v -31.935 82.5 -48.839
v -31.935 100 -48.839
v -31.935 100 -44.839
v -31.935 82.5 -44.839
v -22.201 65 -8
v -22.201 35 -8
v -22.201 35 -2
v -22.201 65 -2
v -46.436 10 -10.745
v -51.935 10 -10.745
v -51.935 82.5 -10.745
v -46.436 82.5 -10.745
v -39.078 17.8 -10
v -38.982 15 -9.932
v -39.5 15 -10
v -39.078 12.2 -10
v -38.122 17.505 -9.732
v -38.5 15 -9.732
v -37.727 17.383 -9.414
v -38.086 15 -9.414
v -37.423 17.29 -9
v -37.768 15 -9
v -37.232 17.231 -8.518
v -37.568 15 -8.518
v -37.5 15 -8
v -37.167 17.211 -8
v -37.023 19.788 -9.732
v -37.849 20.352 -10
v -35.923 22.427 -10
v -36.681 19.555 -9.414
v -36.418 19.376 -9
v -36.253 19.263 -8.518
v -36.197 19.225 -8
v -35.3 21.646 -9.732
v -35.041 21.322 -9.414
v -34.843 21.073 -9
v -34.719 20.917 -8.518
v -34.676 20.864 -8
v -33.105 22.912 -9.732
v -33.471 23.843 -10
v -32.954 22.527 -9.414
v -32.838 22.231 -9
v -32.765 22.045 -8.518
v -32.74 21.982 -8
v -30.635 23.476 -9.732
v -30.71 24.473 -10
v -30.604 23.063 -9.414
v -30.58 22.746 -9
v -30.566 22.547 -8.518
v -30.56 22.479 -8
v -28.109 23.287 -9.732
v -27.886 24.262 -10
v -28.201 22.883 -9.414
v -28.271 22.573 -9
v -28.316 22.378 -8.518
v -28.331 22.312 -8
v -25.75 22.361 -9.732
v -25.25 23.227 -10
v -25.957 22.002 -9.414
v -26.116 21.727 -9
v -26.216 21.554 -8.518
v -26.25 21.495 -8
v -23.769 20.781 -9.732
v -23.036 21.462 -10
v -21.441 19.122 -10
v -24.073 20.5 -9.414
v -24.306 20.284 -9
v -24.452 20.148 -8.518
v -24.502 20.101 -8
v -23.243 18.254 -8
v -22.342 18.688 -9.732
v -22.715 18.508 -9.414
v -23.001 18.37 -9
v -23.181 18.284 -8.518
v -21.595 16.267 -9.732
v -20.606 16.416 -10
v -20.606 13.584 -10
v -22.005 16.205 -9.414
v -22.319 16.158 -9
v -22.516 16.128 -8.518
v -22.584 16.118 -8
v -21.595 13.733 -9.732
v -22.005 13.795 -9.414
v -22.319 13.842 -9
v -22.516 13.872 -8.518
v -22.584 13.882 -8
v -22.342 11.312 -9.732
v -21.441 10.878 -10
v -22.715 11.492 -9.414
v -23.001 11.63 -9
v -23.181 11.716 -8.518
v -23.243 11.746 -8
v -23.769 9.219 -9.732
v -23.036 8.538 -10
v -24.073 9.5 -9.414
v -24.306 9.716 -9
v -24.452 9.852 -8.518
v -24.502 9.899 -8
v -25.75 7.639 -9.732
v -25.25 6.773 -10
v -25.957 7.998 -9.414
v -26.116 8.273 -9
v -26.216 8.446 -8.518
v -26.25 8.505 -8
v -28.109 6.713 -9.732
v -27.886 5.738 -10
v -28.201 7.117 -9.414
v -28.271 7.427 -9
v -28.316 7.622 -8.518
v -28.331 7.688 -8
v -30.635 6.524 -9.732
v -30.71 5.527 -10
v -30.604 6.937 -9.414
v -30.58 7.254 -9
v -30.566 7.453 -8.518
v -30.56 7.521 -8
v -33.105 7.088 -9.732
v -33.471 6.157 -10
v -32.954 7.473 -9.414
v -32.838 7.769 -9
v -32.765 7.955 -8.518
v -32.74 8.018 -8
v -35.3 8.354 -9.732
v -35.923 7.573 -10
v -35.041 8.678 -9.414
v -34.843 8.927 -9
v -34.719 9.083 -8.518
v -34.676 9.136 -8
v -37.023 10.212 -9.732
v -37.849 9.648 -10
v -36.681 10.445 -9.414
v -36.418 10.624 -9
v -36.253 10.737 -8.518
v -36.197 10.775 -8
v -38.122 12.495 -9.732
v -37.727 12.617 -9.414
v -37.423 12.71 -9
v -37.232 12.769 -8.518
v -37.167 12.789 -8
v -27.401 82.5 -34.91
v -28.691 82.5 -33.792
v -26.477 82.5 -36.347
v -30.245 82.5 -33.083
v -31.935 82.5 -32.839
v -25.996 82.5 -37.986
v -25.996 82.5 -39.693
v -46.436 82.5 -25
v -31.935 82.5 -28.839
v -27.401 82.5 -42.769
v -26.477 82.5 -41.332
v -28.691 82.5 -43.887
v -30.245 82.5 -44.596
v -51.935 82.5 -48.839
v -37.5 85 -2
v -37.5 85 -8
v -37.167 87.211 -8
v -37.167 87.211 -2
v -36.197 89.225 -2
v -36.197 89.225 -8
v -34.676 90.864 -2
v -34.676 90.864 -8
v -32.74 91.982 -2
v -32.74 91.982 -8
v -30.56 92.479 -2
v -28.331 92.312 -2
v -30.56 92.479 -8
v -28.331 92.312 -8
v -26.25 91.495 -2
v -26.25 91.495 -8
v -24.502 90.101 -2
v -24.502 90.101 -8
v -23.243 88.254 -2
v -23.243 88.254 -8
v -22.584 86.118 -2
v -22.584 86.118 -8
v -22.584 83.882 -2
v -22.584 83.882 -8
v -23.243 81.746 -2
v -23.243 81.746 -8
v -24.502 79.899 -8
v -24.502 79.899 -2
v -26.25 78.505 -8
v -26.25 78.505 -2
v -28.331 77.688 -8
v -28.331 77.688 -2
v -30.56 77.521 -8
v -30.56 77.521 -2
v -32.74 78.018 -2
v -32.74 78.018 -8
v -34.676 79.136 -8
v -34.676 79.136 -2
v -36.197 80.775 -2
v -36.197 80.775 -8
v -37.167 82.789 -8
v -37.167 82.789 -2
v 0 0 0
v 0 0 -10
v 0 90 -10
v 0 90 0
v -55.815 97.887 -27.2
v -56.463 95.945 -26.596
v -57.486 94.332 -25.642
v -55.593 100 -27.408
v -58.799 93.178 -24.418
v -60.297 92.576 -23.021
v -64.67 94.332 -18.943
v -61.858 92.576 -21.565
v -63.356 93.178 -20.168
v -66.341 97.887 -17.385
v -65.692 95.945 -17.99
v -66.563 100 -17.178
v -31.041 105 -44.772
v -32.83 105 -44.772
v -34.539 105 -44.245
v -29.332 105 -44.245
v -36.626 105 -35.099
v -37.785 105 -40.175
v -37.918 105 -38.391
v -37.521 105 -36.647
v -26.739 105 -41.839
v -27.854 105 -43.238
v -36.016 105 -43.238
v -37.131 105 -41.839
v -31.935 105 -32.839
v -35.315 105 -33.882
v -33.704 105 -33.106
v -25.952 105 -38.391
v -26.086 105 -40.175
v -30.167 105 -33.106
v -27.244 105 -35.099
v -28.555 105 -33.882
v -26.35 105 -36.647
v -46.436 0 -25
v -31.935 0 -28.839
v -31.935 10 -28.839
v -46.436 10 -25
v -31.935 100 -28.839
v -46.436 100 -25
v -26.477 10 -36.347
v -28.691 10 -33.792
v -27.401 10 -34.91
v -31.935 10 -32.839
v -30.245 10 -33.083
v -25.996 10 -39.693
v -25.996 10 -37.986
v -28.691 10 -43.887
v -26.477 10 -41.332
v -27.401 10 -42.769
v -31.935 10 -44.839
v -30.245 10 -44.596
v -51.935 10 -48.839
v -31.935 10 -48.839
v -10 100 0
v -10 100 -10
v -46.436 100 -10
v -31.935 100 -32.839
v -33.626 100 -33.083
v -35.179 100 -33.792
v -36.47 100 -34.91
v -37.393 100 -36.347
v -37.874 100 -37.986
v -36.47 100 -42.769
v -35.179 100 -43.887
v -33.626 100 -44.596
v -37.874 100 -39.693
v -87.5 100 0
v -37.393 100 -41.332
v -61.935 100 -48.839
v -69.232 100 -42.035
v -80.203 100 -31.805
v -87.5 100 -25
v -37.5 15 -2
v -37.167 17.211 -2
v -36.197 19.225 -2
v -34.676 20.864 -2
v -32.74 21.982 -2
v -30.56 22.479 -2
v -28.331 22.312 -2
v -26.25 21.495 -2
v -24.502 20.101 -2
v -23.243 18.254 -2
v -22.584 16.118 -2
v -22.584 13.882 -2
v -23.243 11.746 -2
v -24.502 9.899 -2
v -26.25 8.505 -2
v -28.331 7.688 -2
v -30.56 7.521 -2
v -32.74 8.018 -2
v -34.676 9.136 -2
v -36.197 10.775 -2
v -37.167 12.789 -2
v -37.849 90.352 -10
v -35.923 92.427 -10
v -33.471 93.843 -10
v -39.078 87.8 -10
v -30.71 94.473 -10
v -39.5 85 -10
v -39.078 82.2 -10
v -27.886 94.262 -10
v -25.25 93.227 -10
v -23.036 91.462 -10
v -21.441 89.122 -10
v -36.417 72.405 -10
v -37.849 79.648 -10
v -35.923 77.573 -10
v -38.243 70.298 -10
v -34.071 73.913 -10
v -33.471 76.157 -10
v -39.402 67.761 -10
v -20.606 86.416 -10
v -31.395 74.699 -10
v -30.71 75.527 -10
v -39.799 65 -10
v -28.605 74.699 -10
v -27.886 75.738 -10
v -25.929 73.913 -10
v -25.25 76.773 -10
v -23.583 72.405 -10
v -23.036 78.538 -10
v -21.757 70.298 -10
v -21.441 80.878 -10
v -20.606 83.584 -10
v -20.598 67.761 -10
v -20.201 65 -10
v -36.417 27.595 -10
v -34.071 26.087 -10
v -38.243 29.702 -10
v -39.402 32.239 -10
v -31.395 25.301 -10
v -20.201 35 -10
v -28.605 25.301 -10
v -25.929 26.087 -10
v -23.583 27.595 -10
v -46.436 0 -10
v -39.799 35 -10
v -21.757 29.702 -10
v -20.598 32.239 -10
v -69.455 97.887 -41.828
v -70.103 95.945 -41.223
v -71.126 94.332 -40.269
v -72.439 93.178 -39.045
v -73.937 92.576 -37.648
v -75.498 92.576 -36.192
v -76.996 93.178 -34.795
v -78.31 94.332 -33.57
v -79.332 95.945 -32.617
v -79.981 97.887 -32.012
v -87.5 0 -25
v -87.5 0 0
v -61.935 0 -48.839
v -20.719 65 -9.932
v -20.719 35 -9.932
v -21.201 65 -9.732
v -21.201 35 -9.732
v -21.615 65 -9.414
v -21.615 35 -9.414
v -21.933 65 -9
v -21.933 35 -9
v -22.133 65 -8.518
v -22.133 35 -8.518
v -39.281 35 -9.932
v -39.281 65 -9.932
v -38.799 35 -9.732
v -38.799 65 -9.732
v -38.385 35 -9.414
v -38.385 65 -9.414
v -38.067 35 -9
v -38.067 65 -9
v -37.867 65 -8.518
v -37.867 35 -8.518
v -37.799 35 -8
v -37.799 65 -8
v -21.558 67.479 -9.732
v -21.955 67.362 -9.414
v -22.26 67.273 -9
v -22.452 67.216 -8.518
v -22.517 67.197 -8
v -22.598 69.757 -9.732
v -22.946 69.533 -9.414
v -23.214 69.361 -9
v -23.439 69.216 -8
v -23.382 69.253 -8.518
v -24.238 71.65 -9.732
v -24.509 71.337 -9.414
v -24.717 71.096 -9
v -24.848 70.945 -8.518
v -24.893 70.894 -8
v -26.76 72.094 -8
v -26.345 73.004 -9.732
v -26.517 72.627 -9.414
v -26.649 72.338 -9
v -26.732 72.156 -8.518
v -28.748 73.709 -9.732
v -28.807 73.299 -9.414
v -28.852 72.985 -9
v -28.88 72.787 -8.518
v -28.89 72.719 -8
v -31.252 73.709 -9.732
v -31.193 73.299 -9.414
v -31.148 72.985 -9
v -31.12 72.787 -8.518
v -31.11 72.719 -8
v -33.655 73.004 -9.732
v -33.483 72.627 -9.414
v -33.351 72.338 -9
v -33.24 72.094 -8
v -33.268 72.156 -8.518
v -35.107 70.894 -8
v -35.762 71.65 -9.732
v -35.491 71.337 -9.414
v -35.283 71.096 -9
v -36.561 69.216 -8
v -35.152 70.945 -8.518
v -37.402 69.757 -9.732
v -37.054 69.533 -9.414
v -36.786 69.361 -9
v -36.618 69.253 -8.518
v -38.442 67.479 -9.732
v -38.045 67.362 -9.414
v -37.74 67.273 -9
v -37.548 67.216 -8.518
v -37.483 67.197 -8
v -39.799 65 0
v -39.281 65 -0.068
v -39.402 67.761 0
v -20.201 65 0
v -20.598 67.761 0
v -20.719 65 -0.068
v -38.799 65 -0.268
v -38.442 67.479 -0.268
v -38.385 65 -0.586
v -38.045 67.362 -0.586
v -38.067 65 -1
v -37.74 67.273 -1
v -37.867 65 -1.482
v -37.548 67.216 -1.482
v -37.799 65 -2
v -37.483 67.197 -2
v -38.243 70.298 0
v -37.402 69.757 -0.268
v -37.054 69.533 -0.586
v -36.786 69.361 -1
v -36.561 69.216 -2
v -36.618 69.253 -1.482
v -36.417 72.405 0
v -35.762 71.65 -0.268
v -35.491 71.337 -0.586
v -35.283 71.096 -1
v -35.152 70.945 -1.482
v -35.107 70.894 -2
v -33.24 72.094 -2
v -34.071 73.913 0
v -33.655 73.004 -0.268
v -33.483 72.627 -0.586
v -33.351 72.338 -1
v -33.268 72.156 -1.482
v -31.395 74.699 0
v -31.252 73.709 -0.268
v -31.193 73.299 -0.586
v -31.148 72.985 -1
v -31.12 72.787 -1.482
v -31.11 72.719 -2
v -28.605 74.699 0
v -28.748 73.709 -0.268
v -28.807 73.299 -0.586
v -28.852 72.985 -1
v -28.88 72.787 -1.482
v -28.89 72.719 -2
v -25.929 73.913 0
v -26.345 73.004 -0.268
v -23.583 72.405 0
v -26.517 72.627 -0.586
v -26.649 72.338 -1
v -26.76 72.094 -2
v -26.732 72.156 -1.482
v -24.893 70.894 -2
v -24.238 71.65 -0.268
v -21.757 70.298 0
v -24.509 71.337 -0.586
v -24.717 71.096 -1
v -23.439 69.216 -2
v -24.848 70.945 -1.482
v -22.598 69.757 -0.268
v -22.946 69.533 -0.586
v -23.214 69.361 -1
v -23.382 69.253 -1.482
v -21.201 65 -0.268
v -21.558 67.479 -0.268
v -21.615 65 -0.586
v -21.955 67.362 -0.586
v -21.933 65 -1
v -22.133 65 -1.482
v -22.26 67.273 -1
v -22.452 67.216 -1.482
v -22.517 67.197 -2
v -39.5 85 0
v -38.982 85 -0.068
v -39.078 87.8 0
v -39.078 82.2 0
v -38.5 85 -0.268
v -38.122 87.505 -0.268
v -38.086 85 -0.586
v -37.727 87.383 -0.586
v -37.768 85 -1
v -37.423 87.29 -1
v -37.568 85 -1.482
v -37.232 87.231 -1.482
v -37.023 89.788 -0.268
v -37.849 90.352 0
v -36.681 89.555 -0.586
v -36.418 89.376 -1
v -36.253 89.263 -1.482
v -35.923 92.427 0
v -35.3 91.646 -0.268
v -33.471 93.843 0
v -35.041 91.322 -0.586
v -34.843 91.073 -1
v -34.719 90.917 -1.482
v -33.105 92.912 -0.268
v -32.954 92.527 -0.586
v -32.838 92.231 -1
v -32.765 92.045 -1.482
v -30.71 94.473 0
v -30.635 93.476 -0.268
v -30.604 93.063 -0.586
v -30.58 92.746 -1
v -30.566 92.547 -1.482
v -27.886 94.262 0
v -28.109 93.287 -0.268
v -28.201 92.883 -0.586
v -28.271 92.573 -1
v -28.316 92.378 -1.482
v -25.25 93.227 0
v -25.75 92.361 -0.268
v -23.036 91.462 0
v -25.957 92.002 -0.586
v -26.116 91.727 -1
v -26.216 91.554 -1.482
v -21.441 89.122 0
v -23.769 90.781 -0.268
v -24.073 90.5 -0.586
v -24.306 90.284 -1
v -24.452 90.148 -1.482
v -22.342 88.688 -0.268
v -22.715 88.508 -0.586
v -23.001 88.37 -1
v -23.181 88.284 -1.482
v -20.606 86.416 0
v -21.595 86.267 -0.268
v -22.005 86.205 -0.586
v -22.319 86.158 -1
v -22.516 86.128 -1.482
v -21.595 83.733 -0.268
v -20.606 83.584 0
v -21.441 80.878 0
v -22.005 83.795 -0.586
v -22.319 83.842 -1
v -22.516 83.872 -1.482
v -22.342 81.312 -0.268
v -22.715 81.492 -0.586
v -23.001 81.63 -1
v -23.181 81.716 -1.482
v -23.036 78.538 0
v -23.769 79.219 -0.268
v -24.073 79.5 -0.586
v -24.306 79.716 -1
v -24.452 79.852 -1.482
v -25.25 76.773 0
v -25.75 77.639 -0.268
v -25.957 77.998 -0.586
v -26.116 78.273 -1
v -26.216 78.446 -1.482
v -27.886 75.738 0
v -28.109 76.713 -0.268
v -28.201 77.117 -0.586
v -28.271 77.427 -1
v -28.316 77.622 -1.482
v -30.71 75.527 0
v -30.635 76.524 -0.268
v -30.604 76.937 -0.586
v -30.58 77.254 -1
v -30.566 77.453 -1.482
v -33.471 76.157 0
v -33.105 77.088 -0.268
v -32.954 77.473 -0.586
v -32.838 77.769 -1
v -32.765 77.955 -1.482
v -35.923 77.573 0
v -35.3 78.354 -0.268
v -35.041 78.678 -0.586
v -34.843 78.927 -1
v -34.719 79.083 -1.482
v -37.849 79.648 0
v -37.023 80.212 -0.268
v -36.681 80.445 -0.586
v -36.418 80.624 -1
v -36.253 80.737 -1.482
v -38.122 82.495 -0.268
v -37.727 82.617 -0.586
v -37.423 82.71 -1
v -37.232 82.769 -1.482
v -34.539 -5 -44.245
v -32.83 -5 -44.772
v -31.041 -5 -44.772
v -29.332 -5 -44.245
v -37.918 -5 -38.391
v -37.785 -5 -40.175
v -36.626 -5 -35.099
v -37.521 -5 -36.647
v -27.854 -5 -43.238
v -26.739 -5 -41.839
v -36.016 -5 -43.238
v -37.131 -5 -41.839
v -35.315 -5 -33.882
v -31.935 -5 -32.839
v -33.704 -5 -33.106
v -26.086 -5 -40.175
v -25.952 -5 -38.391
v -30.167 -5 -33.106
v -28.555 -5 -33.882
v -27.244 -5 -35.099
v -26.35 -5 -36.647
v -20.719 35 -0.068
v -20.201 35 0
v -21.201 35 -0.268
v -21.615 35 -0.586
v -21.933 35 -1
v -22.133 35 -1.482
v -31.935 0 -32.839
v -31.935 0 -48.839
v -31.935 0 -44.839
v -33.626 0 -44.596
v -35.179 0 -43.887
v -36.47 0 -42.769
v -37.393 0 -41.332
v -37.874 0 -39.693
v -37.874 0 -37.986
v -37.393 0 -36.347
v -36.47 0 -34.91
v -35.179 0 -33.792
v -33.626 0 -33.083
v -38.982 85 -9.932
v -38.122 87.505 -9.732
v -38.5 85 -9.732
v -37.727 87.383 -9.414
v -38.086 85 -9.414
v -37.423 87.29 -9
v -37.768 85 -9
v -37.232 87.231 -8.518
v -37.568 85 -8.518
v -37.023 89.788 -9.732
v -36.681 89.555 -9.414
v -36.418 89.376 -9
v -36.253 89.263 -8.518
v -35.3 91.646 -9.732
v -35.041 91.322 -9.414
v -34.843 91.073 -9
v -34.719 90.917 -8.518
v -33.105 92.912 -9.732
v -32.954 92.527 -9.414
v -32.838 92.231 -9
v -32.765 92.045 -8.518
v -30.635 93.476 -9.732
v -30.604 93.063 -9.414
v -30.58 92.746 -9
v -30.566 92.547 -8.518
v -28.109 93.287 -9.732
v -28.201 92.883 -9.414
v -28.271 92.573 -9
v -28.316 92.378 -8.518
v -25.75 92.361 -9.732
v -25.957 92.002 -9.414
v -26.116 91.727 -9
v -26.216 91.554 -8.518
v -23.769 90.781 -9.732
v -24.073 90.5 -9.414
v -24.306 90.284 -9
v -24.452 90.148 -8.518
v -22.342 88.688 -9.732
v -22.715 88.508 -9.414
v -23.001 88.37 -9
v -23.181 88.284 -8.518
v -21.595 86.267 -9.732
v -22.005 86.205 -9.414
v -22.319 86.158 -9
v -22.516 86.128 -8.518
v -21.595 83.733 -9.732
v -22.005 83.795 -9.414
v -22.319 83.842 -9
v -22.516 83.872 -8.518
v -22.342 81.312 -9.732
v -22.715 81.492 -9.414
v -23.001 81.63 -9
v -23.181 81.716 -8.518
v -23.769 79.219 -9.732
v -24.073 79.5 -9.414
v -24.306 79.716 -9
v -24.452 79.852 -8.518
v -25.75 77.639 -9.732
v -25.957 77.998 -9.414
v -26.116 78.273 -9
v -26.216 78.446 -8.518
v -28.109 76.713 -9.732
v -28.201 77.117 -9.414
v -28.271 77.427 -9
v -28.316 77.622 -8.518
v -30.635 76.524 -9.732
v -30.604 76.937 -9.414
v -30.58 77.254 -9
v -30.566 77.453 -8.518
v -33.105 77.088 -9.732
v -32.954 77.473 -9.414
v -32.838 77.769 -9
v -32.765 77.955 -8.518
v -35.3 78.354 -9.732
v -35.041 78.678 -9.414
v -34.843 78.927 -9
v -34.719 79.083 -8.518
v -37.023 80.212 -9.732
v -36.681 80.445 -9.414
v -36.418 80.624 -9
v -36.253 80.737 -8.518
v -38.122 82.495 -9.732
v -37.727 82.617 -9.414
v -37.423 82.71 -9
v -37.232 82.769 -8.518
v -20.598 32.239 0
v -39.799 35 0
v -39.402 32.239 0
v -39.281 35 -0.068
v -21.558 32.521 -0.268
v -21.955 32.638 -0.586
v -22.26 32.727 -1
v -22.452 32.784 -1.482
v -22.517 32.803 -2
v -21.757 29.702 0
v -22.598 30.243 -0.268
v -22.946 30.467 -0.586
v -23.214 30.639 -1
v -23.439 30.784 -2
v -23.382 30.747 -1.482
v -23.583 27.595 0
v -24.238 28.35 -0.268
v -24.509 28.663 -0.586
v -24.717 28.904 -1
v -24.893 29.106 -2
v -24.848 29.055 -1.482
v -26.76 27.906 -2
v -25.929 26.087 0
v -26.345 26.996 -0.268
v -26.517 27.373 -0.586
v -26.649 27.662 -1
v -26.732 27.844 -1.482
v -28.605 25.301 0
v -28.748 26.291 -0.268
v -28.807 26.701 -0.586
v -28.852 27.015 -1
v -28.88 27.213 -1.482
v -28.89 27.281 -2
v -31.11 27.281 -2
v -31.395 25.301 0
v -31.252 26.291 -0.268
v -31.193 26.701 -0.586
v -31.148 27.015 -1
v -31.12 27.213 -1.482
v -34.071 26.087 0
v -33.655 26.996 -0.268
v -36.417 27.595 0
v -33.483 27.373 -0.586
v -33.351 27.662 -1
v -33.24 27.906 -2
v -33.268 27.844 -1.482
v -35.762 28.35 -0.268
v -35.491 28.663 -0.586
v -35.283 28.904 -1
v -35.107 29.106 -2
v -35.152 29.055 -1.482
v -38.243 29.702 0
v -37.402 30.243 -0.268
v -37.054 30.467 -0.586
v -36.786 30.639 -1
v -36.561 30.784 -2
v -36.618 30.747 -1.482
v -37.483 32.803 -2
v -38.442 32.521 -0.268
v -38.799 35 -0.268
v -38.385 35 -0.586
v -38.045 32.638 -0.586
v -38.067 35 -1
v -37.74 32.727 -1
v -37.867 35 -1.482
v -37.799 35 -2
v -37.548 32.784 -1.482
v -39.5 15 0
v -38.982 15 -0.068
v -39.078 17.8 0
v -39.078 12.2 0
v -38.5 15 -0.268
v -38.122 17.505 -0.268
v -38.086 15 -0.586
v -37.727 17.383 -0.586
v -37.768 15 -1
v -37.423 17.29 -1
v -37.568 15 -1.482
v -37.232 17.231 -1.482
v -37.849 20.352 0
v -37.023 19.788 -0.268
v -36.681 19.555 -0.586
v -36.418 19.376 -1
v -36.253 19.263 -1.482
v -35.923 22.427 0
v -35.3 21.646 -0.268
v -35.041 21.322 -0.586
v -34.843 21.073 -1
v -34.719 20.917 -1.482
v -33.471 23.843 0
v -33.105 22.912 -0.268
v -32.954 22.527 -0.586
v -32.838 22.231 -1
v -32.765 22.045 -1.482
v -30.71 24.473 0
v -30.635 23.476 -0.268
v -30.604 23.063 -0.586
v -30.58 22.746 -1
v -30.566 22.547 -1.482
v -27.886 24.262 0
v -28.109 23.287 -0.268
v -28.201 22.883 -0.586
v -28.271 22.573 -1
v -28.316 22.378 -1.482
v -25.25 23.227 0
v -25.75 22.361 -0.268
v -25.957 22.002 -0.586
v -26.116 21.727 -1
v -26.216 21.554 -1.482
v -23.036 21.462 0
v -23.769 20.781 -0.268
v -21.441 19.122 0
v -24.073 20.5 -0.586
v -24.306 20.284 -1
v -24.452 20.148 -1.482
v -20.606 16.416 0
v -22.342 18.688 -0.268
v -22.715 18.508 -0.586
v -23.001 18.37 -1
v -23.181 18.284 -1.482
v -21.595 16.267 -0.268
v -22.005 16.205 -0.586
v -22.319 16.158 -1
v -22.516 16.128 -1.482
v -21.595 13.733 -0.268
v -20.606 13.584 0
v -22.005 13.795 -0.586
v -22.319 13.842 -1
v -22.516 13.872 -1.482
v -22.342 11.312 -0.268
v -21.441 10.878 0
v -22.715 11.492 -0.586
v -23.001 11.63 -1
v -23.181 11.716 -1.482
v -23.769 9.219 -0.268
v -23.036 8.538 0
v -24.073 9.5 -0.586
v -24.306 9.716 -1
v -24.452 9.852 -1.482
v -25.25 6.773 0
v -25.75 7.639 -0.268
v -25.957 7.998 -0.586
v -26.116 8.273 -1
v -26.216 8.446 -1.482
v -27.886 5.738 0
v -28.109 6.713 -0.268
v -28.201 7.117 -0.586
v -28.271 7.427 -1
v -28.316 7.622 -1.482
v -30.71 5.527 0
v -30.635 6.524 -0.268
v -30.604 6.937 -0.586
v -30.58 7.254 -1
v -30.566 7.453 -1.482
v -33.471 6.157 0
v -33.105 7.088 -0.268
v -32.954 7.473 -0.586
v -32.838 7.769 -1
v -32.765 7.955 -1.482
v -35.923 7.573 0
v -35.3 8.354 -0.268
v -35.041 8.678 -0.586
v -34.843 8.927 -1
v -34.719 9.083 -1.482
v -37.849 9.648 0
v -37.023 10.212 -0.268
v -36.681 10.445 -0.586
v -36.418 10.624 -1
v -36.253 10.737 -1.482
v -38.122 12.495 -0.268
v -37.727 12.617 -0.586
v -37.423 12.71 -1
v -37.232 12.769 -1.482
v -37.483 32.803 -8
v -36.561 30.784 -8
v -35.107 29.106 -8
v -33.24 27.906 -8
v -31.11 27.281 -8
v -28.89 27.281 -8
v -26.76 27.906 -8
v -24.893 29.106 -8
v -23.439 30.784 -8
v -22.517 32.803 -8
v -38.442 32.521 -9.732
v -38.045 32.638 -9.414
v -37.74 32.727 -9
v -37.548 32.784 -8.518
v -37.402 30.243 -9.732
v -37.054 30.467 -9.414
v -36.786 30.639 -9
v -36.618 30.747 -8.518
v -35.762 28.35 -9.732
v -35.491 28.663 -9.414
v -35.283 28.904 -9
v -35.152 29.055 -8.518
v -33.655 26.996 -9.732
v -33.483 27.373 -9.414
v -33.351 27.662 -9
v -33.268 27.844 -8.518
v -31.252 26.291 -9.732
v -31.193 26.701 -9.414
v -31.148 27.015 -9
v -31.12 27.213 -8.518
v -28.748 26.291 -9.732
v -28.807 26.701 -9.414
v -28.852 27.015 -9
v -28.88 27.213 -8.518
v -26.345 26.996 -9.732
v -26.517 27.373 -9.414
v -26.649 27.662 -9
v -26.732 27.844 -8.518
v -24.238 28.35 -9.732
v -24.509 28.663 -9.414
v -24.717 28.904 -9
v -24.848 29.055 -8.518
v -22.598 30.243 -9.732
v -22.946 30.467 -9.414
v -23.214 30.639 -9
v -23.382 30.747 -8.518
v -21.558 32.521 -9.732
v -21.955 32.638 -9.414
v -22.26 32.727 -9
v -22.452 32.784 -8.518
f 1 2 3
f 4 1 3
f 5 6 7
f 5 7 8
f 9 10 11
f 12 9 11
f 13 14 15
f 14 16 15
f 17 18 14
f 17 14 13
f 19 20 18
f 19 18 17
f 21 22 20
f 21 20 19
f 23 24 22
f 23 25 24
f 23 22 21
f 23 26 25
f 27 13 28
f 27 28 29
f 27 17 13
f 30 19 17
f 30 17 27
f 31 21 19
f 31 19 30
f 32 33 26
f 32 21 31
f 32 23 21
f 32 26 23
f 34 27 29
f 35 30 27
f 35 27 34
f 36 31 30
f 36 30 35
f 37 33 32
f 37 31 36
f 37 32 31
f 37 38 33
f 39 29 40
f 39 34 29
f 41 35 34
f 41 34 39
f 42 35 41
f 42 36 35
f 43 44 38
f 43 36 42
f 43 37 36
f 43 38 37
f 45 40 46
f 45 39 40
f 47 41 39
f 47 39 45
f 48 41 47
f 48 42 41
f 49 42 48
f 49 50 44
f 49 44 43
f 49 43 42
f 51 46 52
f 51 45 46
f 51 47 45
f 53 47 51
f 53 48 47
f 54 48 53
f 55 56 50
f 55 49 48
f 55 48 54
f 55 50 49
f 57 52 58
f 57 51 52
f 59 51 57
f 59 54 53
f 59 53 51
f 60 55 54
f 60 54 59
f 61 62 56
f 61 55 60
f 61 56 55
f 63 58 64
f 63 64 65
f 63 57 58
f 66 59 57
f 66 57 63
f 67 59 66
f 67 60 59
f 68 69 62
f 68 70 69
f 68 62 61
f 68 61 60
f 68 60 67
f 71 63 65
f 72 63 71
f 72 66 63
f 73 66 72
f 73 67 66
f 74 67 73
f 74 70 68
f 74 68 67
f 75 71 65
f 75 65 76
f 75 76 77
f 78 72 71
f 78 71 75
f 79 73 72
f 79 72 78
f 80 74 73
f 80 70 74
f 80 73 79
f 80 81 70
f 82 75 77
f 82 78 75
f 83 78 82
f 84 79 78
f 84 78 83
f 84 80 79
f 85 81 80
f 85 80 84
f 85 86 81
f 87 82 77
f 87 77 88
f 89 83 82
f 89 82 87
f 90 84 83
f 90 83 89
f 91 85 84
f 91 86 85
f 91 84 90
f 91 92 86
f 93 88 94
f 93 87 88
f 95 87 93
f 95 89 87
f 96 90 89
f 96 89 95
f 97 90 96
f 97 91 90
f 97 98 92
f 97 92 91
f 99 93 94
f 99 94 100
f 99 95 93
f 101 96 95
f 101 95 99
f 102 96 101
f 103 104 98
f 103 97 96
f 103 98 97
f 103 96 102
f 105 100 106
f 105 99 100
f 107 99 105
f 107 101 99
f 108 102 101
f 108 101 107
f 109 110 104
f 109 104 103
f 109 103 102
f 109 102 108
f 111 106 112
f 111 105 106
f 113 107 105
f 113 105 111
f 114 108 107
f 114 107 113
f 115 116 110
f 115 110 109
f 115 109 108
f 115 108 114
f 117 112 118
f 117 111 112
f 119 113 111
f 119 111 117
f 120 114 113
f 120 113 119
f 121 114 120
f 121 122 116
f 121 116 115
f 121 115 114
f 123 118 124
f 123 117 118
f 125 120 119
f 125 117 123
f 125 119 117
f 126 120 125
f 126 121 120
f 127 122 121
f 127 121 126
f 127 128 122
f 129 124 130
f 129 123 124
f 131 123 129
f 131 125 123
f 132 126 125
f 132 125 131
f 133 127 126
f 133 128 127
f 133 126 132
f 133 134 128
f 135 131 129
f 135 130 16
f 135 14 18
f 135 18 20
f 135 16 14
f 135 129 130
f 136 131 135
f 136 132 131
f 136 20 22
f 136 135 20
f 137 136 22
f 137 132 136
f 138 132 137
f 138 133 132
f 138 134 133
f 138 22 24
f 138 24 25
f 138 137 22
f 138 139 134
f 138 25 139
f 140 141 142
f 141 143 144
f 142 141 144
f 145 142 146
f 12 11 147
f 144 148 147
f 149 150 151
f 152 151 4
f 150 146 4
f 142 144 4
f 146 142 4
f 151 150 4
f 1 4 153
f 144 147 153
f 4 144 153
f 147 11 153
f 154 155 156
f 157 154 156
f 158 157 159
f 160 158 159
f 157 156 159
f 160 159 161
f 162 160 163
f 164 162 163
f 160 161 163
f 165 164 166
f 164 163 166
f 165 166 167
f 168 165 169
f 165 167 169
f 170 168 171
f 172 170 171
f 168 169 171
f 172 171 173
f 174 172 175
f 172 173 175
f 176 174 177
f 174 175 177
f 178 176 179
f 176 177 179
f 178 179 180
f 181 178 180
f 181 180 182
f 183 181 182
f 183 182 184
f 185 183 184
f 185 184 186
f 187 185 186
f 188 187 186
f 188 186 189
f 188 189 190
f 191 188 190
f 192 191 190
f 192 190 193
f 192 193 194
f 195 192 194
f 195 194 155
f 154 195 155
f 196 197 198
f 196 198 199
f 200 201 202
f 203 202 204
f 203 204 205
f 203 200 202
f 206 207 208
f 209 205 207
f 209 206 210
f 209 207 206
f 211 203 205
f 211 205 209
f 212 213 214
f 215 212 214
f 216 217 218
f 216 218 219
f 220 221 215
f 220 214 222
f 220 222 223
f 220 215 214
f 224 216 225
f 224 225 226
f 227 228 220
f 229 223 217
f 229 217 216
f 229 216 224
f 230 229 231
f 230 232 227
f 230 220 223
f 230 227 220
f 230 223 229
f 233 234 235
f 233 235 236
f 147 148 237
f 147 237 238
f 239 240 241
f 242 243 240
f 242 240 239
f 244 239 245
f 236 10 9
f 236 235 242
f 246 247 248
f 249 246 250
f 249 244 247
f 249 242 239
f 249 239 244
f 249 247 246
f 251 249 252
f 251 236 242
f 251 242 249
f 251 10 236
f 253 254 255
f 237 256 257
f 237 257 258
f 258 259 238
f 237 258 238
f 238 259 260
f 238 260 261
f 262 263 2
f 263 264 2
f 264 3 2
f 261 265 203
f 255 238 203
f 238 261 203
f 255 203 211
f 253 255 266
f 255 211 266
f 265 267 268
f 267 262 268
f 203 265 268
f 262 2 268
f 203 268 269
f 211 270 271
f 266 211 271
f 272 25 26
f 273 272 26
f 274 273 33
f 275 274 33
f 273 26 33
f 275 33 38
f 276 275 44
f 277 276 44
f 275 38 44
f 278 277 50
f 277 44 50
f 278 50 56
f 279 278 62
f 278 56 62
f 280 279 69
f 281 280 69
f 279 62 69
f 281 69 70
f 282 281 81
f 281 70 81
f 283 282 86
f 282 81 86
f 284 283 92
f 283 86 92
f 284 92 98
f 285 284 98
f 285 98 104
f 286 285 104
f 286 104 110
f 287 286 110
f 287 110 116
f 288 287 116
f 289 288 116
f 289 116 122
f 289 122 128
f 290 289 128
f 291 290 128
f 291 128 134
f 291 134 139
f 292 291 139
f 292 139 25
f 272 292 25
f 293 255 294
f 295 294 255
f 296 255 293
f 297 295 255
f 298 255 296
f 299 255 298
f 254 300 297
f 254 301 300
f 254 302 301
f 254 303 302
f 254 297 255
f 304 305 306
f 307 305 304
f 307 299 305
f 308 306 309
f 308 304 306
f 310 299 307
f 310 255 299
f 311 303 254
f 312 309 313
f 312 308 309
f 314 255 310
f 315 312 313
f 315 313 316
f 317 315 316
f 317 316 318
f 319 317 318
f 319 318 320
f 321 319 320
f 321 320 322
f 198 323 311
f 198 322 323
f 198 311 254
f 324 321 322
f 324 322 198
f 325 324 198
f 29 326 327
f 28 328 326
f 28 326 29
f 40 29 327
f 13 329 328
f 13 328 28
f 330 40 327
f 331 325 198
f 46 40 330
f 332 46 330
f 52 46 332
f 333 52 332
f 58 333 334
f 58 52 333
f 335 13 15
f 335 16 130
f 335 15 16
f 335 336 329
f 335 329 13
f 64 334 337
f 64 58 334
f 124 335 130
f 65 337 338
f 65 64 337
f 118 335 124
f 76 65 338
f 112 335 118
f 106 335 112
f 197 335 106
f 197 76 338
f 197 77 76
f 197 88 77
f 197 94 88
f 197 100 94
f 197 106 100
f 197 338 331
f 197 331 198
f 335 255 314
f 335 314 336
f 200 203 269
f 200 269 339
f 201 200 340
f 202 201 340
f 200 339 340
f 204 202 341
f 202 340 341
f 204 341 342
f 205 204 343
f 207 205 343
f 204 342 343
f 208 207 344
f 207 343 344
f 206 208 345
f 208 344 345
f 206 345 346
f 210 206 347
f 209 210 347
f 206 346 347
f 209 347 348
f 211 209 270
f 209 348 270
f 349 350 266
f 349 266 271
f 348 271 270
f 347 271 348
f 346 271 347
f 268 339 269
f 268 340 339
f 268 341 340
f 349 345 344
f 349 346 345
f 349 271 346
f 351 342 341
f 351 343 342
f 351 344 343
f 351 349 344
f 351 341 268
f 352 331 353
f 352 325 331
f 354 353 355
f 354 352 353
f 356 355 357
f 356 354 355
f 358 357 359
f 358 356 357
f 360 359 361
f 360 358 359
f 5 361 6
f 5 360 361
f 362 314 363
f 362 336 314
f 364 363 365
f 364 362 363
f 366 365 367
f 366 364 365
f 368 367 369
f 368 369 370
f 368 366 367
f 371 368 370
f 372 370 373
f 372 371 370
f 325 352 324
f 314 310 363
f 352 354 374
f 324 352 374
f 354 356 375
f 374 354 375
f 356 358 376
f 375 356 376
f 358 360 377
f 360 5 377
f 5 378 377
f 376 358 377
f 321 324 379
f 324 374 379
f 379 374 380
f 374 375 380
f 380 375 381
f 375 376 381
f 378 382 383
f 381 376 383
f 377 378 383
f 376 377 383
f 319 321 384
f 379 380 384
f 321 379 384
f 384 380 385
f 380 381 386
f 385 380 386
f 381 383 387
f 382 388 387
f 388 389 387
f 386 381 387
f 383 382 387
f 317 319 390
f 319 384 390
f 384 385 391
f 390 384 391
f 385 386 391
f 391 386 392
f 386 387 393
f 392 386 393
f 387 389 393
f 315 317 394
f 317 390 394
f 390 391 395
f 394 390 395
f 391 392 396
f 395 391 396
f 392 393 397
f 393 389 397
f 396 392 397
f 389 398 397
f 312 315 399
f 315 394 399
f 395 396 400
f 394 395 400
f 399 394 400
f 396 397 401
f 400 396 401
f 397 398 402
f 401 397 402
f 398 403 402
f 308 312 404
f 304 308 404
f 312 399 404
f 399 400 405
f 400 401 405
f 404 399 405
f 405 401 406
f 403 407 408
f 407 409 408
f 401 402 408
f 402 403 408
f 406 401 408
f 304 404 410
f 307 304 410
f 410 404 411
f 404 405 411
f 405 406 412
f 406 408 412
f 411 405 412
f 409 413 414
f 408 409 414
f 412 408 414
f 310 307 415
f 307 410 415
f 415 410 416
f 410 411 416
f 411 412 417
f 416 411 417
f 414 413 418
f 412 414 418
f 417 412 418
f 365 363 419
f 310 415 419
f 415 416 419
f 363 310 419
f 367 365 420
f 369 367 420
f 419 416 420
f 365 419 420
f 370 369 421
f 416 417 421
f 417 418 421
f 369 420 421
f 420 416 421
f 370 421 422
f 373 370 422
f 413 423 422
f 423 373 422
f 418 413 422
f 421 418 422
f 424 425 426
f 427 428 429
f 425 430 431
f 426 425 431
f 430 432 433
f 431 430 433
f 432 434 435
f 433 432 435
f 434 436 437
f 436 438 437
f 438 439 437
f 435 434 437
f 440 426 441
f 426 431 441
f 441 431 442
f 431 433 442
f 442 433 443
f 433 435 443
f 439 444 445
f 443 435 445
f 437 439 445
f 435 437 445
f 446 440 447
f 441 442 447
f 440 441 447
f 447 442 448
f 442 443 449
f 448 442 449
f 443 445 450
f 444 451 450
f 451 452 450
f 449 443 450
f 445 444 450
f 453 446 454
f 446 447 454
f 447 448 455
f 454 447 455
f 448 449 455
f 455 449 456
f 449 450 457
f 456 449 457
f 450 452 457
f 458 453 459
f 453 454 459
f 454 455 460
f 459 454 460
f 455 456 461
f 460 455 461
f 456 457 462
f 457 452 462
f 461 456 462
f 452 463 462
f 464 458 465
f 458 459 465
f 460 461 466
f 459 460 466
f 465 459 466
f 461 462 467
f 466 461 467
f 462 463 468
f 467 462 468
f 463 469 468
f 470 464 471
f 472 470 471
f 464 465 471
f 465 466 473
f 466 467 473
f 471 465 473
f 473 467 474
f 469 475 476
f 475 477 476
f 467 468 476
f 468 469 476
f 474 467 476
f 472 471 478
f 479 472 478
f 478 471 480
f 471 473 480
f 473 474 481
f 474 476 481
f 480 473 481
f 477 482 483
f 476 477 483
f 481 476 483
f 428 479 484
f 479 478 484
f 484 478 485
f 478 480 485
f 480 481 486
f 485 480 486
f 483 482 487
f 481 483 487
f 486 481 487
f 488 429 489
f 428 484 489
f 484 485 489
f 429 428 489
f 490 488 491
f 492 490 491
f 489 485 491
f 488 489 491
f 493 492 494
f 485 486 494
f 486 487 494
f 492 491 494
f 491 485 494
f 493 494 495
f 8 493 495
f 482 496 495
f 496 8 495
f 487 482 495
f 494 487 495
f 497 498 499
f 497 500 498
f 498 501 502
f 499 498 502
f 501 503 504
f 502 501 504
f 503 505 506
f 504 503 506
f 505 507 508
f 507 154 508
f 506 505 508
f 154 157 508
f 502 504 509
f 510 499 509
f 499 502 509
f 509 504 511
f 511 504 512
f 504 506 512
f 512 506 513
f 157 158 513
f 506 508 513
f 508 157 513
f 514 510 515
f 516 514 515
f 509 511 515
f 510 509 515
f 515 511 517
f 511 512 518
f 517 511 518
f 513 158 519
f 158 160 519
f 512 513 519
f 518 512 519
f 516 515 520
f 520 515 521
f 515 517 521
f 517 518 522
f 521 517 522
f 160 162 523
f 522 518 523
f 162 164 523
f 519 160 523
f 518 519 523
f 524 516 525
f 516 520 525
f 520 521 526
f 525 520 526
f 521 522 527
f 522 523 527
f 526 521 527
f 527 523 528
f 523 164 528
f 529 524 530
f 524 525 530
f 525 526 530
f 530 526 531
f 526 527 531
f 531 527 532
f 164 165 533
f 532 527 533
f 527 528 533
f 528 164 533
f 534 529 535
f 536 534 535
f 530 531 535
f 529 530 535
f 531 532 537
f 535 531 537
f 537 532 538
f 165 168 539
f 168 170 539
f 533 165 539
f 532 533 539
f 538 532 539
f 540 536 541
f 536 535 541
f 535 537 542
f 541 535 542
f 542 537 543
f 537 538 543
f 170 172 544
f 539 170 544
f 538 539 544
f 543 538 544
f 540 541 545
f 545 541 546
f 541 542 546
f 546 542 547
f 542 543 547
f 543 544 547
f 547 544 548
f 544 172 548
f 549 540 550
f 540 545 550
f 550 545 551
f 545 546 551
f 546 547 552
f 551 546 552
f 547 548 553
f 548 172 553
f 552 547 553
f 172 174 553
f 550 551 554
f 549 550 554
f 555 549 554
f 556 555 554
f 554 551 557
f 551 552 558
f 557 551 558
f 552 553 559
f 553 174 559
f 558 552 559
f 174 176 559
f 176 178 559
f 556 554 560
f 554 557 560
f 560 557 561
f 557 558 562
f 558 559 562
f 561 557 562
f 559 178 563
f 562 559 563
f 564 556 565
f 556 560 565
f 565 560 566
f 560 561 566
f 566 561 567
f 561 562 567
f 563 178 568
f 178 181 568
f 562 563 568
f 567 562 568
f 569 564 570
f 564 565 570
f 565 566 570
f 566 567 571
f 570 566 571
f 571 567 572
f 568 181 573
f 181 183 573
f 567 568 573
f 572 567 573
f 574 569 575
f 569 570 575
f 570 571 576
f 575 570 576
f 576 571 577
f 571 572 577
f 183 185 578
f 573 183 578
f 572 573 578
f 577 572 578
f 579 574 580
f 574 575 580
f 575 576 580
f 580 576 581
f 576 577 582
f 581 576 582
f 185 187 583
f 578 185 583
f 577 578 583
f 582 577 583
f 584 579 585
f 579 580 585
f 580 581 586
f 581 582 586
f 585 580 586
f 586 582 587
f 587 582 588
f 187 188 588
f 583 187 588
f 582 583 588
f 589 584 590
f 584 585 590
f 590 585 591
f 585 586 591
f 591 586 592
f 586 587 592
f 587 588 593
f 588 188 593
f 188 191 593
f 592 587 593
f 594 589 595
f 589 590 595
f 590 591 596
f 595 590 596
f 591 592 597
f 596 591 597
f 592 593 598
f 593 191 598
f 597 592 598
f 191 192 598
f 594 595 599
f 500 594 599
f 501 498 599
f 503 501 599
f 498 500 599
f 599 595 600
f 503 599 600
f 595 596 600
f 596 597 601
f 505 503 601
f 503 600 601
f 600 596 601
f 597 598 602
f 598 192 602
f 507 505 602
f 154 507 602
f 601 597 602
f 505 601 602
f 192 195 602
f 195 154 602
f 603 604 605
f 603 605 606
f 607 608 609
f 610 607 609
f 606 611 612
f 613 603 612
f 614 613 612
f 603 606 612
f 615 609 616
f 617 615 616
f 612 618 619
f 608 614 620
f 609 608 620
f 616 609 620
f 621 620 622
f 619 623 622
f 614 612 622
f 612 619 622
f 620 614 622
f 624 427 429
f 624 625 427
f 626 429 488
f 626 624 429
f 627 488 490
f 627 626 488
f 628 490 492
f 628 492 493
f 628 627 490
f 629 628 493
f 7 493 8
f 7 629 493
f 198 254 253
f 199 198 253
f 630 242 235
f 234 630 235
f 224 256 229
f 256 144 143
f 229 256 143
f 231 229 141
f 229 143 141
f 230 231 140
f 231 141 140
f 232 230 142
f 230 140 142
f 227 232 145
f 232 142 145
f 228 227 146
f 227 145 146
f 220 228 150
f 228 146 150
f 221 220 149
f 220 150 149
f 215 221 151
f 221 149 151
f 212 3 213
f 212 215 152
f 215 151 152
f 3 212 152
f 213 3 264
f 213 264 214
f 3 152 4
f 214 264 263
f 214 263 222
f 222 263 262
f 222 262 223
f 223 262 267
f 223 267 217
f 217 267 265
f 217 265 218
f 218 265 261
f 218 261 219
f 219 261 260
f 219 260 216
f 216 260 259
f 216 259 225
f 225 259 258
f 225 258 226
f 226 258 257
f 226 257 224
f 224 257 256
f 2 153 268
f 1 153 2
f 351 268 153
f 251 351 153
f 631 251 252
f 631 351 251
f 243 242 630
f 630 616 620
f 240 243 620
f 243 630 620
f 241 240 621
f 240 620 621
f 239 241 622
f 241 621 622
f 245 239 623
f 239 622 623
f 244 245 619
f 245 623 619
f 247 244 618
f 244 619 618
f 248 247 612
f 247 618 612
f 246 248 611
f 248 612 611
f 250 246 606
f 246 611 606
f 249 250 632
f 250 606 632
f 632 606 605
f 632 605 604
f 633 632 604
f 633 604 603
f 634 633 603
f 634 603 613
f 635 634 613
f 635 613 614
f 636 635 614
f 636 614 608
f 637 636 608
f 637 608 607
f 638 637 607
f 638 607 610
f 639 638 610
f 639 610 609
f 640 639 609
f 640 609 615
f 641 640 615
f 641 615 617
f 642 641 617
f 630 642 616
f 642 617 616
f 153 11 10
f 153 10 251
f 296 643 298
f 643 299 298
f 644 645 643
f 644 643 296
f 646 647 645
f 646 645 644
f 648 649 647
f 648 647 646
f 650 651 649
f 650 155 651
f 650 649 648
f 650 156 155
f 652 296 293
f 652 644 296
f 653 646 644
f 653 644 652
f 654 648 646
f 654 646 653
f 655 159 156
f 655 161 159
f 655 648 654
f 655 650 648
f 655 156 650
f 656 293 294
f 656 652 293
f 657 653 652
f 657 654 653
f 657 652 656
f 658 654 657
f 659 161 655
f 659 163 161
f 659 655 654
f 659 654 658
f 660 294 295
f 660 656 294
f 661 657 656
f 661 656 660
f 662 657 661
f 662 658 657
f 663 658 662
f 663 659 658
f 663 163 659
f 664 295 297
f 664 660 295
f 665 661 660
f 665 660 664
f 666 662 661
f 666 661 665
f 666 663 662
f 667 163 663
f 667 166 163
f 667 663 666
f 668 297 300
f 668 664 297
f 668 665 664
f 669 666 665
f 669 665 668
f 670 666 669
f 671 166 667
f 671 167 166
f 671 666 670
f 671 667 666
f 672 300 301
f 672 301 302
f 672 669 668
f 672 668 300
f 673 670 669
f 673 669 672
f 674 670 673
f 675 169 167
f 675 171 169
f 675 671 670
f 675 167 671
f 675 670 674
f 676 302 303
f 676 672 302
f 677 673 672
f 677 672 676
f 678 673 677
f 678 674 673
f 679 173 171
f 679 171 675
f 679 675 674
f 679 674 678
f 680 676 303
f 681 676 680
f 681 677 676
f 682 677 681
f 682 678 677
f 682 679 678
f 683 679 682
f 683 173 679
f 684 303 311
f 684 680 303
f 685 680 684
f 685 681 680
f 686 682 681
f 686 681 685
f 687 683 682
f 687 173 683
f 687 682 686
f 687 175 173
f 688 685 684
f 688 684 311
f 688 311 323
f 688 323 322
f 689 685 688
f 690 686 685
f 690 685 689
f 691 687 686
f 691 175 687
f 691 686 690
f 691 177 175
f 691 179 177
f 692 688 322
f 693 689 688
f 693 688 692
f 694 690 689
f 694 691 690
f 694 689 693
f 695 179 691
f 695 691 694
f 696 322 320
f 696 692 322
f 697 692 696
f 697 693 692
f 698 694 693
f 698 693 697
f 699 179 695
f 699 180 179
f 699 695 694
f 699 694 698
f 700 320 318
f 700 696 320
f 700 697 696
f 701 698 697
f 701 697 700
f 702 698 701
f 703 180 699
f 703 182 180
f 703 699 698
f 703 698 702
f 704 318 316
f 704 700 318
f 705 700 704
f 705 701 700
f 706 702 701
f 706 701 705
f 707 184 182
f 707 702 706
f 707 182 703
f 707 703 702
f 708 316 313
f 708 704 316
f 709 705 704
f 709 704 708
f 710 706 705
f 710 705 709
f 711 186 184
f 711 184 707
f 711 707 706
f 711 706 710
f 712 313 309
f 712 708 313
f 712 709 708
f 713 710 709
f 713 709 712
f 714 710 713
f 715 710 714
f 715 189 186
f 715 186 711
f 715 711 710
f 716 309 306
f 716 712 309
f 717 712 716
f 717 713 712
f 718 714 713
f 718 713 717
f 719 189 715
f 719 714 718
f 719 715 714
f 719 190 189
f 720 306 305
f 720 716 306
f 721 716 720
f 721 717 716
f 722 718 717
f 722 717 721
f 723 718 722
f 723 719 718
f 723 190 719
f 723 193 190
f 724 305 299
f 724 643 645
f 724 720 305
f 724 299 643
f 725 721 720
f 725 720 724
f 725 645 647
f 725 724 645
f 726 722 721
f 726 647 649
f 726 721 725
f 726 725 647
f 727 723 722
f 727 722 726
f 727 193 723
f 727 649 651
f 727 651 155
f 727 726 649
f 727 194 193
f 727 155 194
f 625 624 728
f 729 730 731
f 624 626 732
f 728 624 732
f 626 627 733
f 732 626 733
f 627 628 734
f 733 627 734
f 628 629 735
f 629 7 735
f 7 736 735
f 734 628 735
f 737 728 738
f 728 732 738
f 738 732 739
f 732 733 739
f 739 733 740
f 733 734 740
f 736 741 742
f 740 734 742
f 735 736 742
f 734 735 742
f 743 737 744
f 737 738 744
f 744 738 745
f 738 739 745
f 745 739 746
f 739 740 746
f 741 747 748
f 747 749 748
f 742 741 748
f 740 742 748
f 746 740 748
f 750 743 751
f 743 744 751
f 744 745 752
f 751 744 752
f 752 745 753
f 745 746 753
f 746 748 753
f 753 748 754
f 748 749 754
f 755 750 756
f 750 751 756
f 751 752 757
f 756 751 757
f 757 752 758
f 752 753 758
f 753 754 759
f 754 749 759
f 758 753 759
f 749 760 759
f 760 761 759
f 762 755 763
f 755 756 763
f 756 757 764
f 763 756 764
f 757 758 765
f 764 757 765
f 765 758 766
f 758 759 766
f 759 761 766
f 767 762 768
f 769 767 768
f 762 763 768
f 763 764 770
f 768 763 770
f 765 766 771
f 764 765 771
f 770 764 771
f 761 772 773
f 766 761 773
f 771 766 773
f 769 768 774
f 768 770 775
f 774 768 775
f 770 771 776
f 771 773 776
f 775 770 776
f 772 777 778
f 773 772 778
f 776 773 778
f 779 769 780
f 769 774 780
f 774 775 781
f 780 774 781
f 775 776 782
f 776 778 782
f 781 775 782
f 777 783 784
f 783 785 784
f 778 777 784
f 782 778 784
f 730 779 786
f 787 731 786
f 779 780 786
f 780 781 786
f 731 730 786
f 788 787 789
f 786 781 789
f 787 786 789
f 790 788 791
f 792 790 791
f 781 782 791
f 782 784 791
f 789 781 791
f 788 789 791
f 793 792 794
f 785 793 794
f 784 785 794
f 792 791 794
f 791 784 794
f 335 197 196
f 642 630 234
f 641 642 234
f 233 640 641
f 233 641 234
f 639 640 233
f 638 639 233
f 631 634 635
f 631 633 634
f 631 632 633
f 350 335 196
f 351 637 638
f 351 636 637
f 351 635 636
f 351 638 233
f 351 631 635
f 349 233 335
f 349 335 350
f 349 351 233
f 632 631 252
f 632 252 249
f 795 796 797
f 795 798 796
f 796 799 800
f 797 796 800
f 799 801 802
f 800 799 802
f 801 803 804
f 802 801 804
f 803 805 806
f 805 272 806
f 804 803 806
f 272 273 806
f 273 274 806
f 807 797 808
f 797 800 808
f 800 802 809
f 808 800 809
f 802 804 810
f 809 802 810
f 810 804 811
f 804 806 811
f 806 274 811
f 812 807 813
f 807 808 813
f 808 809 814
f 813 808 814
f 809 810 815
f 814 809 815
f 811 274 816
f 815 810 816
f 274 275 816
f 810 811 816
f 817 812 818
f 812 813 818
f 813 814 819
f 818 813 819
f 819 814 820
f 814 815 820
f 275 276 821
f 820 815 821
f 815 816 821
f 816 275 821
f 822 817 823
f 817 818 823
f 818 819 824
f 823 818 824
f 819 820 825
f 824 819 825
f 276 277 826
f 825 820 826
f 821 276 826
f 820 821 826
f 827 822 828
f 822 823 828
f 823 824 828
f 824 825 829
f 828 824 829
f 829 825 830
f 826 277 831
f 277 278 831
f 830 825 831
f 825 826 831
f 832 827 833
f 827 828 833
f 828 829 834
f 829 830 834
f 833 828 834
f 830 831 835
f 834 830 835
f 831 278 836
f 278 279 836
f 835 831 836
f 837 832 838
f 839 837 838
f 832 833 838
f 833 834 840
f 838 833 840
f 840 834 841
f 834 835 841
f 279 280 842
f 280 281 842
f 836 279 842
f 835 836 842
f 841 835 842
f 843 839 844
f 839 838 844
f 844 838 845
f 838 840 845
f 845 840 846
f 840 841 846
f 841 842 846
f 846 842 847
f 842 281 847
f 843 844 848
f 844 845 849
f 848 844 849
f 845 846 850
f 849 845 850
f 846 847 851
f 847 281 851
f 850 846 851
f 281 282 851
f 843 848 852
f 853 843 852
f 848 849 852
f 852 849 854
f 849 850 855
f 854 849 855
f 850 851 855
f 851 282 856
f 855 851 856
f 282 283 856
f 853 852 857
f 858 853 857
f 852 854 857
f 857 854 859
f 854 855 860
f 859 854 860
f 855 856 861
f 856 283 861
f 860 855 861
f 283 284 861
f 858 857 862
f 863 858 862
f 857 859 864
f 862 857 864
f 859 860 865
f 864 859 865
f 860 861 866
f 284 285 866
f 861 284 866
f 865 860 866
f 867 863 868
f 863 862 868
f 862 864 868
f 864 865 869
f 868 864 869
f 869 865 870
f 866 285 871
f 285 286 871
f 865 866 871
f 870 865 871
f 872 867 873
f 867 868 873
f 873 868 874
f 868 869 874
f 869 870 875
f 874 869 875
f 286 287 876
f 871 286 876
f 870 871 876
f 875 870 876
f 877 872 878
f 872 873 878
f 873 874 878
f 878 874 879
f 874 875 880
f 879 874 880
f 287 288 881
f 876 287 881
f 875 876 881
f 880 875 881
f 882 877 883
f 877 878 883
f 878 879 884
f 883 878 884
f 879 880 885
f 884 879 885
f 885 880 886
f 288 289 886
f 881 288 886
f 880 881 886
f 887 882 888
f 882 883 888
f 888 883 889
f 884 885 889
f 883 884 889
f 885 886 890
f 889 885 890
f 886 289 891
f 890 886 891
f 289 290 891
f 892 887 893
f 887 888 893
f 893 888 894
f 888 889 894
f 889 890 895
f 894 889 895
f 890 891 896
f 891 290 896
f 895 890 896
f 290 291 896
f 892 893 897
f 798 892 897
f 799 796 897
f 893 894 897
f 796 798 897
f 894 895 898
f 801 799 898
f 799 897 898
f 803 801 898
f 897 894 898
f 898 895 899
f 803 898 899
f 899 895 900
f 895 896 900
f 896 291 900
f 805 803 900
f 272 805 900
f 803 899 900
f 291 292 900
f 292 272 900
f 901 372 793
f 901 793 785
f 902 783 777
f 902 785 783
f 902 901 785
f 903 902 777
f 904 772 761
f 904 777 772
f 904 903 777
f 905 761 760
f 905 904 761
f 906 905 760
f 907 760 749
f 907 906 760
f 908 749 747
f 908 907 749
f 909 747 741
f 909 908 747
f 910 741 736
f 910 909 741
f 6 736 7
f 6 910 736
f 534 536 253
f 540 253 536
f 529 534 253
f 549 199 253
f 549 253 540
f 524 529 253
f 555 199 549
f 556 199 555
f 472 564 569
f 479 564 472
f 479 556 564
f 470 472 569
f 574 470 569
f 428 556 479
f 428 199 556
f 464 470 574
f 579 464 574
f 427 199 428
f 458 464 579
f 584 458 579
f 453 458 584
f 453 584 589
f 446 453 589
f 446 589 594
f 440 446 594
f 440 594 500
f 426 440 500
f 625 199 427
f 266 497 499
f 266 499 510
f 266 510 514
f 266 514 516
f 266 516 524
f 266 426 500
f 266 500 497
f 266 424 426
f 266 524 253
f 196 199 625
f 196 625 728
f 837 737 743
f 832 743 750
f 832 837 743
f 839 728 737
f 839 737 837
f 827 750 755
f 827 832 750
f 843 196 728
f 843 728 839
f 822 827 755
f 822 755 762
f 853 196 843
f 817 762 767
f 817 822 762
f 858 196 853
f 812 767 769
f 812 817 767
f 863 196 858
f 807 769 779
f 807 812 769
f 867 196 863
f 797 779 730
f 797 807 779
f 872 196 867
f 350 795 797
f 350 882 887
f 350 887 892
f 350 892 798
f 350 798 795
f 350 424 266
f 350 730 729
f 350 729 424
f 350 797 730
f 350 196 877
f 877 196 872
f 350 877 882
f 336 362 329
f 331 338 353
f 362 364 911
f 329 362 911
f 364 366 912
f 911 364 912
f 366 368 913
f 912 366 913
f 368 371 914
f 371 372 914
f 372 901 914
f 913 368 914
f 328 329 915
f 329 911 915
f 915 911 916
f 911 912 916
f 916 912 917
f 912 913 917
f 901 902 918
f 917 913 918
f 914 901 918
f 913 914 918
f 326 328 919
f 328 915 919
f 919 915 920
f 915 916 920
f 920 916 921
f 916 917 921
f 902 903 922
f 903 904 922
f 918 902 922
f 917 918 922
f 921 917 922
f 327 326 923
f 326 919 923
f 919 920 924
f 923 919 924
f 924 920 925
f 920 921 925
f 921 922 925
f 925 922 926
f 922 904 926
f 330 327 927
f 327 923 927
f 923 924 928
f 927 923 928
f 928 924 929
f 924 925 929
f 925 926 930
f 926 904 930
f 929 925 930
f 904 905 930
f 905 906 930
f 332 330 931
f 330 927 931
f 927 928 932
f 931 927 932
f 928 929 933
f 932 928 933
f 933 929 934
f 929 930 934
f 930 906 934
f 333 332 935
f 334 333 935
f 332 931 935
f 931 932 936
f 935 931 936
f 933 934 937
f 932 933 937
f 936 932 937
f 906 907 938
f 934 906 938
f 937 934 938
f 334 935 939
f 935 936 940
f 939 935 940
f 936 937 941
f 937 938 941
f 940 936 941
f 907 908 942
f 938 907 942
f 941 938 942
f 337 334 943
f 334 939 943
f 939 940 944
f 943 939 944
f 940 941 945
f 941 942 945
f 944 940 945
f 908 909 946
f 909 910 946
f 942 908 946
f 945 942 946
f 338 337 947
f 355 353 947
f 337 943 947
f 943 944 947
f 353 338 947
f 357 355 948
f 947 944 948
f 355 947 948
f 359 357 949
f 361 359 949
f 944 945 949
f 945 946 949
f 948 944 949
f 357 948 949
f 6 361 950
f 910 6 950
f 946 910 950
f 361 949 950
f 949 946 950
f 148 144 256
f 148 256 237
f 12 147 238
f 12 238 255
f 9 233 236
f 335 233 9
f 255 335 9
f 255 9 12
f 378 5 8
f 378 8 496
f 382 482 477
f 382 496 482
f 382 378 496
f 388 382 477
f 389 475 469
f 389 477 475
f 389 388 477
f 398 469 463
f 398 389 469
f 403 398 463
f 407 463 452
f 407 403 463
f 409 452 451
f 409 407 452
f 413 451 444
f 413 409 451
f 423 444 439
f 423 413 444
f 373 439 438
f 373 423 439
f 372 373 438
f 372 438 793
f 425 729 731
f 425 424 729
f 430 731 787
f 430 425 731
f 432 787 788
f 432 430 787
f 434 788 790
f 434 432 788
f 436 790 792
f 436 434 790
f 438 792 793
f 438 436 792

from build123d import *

# Parameters (mm, degrees)
BOSS_EXTRUDE1_DEPTH      = 100
BOSS_EXTRUDE2_DEPTH      = 5
BOSS_EXTRUDE2_DEPTH_BACK = 105
SKETCH2_R                = 6
CUT_EXTRUDE7_DEPTH       = 129.443507792
CUT_EXTRUDE7_DEPTH_BACK  = 20
SKETCH4_W                = 44.006383114
SKETCH4_H                = 72.5
SKETCH5_R                = 7.5
CUT_EXTRUDE8_DEPTH       = 143.090661712
FILLET1_R                = 2
CHAMFER1_SIZE            = 10
SKETCH6_R                = 7.5
CUT_EXTRUDE9_DEPTH       = 20


with BuildPart() as part:
    # Sketch1 → Boss-Extrude1 (new body)
    with BuildSketch(Plane(origin=(0, 0, 0), x_dir=(1, 0, 0), z_dir=(0, 1, 0))):
        Polygon((0, 0), (-87.5, 0), (-87.5, 25), (-61.935274621, 48.839492089), (-31.935274621, 48.839492089), (-31.935274621, 28.839492089), (-46.435560843, 25), (-46.435560843, 10), (0, 10), align=None)
    extrude(amount=BOSS_EXTRUDE1_DEPTH)

    # Sketch2 → Boss-Extrude2 (add, two sides: drawn at the far end of the back side and taken through both)
    with BuildSketch(Plane(origin=(0, 100, 0), x_dir=(1, 0, 0), z_dir=(0, 1, 0)).offset(-BOSS_EXTRUDE2_DEPTH_BACK)):
        with Locations(Location((-31.935274621, 38.839492089, 0), (0, 0, 270))):
            Circle(SKETCH2_R)
    extrude(amount=BOSS_EXTRUDE2_DEPTH + BOSS_EXTRUDE2_DEPTH_BACK)

    # Sketch4 → Cut-Extrude7 (cut, two sides: drawn at the far end of the back side and taken through both)
    with BuildSketch(Plane(origin=(-31.935274621, 0, 0), x_dir=(0, 0, -1), z_dir=(1, 0, 0)).offset(-CUT_EXTRUDE7_DEPTH_BACK)):
        with Locations((32.748434583, 46.25)):
            Rectangle(SKETCH4_W, SKETCH4_H)
    extrude(amount=CUT_EXTRUDE7_DEPTH + CUT_EXTRUDE7_DEPTH_BACK, mode=Mode.SUBTRACT)

    # Sketch5 → Cut-Extrude8 (cut, through all)
    with BuildSketch(Plane(origin=(0, 0, -10), x_dir=(-1, 0, 0), z_dir=(0, 0, -1))):
        with Locations((30, 15)):
            Circle(SKETCH5_R)
        with Locations((30, 85)):
            Circle(SKETCH5_R)
        with BuildLine():
            Line((22.201190531, 35), (22.201190531, 65))
            ThreePointArc((22.201190531, 65), (30, 72.798809469), (37.798809469, 65))
            Line((37.798809469, 65), (37.798809469, 35))
            ThreePointArc((37.798809469, 35), (30, 27.201190531), (22.201190531, 35))
        make_face()
    extrude(amount=-CUT_EXTRUDE8_DEPTH, mode=Mode.SUBTRACT)

    # Fillet1
    fillet1_edges = [part.edges().sort_by_distance(p)[0] for p in [
        (-22.5, 15, 0),
        (-22.5, 15, -10),
        (-22.5, 85, 0),
        (-22.5, 85, -10),
        (-30, 27.201190531, 0),
        (-22.201190531, 50, 0),
        (-30, 72.798809469, 0),
        (-37.798809469, 50, 0),
        (-30, 27.201190531, -10),
        (-37.798809469, 50, -10),
        (-30, 72.798809469, -10),
        (-22.201190531, 50, -10),
    ]]
    fillet(fillet1_edges, radius=FILLET1_R)

    # Chamfer1
    chamfer1_edges = [part.edges().sort_by_distance(p)[0] for p in [
        (0, 100, -5),
    ]]
    chamfer(chamfer1_edges, length=CHAMFER1_SIZE)

    # Sketch6 → Cut-Extrude9 (cut)
    with BuildSketch(Plane(origin=(-53.167704902, 0, -57.015383121), x_dir=(-0.7313537016191667, 0, 0.6819983600625026), z_dir=(-0.6819983600625026, 0, -0.7313537016191667))):
        with Locations((29.465814367, 100)):
            Circle(SKETCH6_R)
    extrude(amount=-CUT_EXTRUDE9_DEPTH, mode=Mode.SUBTRACT)


solid = part.part
